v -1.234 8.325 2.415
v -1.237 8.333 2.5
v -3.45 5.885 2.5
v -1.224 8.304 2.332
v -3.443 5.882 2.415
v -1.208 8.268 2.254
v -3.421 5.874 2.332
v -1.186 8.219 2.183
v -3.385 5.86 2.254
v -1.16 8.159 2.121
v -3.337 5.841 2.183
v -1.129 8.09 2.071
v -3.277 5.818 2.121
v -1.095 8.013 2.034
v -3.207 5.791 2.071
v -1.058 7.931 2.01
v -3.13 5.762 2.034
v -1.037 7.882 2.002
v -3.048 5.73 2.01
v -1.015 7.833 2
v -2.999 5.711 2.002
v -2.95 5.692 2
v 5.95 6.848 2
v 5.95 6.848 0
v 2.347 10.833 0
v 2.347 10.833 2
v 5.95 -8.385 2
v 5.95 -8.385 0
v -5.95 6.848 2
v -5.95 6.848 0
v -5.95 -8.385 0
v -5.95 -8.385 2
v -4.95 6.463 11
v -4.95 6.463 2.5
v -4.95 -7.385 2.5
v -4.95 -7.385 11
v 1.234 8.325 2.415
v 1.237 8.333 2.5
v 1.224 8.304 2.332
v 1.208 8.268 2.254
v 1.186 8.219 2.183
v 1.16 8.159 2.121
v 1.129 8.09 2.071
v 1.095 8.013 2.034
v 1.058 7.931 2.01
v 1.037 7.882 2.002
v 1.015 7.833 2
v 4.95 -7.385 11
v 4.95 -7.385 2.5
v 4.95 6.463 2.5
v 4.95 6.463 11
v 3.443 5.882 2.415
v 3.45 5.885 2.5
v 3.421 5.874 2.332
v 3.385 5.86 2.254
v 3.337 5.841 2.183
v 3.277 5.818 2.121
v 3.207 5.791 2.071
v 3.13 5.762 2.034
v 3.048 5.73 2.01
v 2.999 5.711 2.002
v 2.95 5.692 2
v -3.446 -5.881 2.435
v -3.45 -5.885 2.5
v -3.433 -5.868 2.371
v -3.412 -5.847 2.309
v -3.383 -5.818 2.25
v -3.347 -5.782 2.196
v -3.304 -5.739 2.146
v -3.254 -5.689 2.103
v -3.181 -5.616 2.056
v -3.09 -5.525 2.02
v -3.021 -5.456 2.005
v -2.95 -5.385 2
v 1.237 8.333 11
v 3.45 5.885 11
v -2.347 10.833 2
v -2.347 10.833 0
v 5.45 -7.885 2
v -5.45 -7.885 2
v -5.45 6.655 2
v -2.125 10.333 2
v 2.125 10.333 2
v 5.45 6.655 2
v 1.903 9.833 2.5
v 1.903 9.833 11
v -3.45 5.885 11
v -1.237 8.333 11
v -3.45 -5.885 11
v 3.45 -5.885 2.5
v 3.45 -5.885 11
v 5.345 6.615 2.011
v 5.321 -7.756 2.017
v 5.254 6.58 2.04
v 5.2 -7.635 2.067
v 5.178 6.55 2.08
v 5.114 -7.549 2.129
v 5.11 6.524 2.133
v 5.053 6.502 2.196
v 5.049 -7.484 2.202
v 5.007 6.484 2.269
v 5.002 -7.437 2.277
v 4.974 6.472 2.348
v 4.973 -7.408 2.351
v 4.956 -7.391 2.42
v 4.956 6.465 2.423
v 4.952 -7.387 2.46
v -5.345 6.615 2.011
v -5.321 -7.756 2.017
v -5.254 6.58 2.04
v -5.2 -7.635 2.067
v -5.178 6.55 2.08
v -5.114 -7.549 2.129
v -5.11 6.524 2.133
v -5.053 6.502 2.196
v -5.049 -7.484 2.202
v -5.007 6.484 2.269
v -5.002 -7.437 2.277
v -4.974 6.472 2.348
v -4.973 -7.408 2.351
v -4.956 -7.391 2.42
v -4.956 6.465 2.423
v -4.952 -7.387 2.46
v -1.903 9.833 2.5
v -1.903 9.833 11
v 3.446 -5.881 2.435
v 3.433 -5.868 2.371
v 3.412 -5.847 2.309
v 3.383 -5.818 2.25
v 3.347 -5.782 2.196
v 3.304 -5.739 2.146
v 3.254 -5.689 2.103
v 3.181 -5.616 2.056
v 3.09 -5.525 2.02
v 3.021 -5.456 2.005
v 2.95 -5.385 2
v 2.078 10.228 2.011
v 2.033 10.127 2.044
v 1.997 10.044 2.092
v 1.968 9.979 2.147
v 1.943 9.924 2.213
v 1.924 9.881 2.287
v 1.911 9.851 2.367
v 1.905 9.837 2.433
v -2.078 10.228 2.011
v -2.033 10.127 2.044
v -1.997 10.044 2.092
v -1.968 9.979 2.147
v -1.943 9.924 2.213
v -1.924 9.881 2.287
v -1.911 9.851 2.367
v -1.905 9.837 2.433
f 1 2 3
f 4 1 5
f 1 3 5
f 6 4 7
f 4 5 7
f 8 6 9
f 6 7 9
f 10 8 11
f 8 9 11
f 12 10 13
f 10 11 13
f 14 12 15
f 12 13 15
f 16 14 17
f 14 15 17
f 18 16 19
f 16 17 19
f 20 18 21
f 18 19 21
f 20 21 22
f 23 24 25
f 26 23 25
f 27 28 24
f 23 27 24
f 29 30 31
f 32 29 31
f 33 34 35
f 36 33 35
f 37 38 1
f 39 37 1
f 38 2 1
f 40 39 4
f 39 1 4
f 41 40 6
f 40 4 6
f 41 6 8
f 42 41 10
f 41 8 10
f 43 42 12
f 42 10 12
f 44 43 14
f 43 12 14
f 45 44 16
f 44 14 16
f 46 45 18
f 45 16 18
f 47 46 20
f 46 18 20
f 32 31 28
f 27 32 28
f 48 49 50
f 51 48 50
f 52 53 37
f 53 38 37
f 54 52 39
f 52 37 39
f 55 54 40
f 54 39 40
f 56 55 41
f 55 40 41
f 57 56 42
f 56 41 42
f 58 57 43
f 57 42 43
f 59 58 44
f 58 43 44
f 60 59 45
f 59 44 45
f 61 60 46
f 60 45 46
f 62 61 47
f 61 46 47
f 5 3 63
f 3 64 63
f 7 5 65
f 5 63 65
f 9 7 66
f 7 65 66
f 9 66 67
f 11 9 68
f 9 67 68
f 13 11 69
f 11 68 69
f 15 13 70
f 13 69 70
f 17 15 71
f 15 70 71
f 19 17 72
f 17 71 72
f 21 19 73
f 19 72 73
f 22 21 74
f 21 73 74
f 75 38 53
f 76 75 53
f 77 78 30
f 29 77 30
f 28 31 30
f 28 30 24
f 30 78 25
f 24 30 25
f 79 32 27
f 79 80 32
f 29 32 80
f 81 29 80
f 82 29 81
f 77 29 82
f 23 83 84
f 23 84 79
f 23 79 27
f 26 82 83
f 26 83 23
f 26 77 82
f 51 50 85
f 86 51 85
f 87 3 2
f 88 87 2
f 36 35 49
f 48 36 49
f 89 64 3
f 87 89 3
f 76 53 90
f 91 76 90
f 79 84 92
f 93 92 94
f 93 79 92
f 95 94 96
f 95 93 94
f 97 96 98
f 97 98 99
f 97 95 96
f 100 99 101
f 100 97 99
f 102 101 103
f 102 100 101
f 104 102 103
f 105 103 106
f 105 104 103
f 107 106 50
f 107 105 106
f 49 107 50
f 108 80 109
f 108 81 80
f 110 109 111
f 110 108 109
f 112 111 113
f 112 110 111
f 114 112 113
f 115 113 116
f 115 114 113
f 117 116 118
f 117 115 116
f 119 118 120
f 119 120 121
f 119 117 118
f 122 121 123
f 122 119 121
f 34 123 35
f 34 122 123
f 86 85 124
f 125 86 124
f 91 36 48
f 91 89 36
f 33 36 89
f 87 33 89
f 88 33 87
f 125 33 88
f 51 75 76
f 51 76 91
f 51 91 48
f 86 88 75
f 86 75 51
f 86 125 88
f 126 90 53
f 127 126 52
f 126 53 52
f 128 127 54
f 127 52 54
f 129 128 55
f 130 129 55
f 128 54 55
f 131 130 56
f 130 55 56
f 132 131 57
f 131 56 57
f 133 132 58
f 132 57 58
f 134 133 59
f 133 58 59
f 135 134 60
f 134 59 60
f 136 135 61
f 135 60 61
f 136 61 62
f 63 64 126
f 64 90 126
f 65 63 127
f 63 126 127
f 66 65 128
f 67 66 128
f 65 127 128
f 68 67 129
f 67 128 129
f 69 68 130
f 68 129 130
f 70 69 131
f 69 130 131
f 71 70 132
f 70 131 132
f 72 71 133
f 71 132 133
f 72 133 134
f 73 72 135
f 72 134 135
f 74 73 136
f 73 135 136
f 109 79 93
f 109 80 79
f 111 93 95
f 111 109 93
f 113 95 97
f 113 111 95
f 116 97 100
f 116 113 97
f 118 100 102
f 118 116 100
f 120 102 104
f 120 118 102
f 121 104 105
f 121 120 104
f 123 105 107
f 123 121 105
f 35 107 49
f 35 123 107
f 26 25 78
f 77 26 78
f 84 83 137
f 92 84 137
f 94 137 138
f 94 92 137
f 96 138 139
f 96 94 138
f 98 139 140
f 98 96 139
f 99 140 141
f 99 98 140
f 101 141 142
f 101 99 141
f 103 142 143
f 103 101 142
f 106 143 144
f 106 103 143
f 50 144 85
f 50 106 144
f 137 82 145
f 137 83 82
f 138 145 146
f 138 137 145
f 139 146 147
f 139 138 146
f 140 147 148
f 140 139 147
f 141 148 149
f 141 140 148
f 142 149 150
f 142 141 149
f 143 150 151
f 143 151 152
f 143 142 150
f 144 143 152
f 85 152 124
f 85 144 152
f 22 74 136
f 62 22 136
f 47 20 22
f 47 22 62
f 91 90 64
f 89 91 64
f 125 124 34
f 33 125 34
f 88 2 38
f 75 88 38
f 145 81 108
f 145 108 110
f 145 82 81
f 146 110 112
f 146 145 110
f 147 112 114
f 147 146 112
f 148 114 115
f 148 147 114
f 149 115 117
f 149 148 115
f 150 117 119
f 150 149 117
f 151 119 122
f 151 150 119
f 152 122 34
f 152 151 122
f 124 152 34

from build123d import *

# Parameters (mm, degrees)
F0_W     = 6.9
F0_H     = 11.77
F1_DEPTH = 2
F2_DEPTH = 11
F3_R     = 0.5


with BuildPart() as f1:
    # F0 (on Top) → F1 (new body)
    with BuildSketch(Plane.XY):
        Polygon((-2.3468033714, 10.8328205479), (-5.95, 6.8476179095), (-5.95, -8.385), (5.95, -8.385), (5.95, 6.8476179095), (2.3468033714, 10.8328205479), align=None)
        Polygon((-4.95, -7.385), (-4.95, 6.4625707457), (-1.9028092228, 9.8328205479), (1.9028092228, 9.8328205479), (4.95, 6.4625707457), (4.95, -7.385), align=None, mode=Mode.SUBTRACT)
        Polygon((-1.9028092228, 9.8328205479), (-4.95, 6.4625707457), (-4.95, -7.385), (4.95, -7.385), (4.95, 6.4625707457), (1.9028092228, 9.8328205479), align=None)
        Polygon((1.236818, 8.3328205479), (3.45, 5.885), (3.45, -5.885), (-3.45, -5.885), (-3.45, 5.885), (-1.236818, 8.3328205479), align=None, mode=Mode.SUBTRACT)
        Polygon((-3.45, 5.885), (3.45, 5.885), (1.236818, 8.3328205479), (-1.236818, 8.3328205479), align=None)
        Rectangle(F0_W, F0_H)
    extrude(amount=F1_DEPTH)

    # F0 (on Top) → F2 (join)
    with BuildSketch(Plane.XY):
        Polygon((-1.9028092228, 9.8328205479), (-4.95, 6.4625707457), (-4.95, -7.385), (4.95, -7.385), (4.95, 6.4625707457), (1.9028092228, 9.8328205479), align=None)
        Polygon((1.236818, 8.3328205479), (3.45, 5.885), (3.45, -5.885), (-3.45, -5.885), (-3.45, 5.885), (-1.236818, 8.3328205479), align=None, mode=Mode.SUBTRACT)
    extrude(amount=F2_DEPTH)

    # F3
    f3_edges = [f1.edges().sort_by_distance(p)[0] for p in [
        (-3.45, 0, 2),
        (-2.343409, 7.10891, 2),
        (0, 8.332821, 2),
        (2.343409, 7.10891, 2),
        (3.45, 0, 2),
        (0, -5.885, 2),
        (0, -7.385, 2),
        (4.95, -0.461215, 2),
        (3.426405, 8.147696, 2),
        (0, 9.832821, 2),
        (-3.426405, 8.147696, 2),
        (-4.95, -0.461215, 2),
    ]]
    fillet(f3_edges, radius=F3_R)


solid = f1.part
